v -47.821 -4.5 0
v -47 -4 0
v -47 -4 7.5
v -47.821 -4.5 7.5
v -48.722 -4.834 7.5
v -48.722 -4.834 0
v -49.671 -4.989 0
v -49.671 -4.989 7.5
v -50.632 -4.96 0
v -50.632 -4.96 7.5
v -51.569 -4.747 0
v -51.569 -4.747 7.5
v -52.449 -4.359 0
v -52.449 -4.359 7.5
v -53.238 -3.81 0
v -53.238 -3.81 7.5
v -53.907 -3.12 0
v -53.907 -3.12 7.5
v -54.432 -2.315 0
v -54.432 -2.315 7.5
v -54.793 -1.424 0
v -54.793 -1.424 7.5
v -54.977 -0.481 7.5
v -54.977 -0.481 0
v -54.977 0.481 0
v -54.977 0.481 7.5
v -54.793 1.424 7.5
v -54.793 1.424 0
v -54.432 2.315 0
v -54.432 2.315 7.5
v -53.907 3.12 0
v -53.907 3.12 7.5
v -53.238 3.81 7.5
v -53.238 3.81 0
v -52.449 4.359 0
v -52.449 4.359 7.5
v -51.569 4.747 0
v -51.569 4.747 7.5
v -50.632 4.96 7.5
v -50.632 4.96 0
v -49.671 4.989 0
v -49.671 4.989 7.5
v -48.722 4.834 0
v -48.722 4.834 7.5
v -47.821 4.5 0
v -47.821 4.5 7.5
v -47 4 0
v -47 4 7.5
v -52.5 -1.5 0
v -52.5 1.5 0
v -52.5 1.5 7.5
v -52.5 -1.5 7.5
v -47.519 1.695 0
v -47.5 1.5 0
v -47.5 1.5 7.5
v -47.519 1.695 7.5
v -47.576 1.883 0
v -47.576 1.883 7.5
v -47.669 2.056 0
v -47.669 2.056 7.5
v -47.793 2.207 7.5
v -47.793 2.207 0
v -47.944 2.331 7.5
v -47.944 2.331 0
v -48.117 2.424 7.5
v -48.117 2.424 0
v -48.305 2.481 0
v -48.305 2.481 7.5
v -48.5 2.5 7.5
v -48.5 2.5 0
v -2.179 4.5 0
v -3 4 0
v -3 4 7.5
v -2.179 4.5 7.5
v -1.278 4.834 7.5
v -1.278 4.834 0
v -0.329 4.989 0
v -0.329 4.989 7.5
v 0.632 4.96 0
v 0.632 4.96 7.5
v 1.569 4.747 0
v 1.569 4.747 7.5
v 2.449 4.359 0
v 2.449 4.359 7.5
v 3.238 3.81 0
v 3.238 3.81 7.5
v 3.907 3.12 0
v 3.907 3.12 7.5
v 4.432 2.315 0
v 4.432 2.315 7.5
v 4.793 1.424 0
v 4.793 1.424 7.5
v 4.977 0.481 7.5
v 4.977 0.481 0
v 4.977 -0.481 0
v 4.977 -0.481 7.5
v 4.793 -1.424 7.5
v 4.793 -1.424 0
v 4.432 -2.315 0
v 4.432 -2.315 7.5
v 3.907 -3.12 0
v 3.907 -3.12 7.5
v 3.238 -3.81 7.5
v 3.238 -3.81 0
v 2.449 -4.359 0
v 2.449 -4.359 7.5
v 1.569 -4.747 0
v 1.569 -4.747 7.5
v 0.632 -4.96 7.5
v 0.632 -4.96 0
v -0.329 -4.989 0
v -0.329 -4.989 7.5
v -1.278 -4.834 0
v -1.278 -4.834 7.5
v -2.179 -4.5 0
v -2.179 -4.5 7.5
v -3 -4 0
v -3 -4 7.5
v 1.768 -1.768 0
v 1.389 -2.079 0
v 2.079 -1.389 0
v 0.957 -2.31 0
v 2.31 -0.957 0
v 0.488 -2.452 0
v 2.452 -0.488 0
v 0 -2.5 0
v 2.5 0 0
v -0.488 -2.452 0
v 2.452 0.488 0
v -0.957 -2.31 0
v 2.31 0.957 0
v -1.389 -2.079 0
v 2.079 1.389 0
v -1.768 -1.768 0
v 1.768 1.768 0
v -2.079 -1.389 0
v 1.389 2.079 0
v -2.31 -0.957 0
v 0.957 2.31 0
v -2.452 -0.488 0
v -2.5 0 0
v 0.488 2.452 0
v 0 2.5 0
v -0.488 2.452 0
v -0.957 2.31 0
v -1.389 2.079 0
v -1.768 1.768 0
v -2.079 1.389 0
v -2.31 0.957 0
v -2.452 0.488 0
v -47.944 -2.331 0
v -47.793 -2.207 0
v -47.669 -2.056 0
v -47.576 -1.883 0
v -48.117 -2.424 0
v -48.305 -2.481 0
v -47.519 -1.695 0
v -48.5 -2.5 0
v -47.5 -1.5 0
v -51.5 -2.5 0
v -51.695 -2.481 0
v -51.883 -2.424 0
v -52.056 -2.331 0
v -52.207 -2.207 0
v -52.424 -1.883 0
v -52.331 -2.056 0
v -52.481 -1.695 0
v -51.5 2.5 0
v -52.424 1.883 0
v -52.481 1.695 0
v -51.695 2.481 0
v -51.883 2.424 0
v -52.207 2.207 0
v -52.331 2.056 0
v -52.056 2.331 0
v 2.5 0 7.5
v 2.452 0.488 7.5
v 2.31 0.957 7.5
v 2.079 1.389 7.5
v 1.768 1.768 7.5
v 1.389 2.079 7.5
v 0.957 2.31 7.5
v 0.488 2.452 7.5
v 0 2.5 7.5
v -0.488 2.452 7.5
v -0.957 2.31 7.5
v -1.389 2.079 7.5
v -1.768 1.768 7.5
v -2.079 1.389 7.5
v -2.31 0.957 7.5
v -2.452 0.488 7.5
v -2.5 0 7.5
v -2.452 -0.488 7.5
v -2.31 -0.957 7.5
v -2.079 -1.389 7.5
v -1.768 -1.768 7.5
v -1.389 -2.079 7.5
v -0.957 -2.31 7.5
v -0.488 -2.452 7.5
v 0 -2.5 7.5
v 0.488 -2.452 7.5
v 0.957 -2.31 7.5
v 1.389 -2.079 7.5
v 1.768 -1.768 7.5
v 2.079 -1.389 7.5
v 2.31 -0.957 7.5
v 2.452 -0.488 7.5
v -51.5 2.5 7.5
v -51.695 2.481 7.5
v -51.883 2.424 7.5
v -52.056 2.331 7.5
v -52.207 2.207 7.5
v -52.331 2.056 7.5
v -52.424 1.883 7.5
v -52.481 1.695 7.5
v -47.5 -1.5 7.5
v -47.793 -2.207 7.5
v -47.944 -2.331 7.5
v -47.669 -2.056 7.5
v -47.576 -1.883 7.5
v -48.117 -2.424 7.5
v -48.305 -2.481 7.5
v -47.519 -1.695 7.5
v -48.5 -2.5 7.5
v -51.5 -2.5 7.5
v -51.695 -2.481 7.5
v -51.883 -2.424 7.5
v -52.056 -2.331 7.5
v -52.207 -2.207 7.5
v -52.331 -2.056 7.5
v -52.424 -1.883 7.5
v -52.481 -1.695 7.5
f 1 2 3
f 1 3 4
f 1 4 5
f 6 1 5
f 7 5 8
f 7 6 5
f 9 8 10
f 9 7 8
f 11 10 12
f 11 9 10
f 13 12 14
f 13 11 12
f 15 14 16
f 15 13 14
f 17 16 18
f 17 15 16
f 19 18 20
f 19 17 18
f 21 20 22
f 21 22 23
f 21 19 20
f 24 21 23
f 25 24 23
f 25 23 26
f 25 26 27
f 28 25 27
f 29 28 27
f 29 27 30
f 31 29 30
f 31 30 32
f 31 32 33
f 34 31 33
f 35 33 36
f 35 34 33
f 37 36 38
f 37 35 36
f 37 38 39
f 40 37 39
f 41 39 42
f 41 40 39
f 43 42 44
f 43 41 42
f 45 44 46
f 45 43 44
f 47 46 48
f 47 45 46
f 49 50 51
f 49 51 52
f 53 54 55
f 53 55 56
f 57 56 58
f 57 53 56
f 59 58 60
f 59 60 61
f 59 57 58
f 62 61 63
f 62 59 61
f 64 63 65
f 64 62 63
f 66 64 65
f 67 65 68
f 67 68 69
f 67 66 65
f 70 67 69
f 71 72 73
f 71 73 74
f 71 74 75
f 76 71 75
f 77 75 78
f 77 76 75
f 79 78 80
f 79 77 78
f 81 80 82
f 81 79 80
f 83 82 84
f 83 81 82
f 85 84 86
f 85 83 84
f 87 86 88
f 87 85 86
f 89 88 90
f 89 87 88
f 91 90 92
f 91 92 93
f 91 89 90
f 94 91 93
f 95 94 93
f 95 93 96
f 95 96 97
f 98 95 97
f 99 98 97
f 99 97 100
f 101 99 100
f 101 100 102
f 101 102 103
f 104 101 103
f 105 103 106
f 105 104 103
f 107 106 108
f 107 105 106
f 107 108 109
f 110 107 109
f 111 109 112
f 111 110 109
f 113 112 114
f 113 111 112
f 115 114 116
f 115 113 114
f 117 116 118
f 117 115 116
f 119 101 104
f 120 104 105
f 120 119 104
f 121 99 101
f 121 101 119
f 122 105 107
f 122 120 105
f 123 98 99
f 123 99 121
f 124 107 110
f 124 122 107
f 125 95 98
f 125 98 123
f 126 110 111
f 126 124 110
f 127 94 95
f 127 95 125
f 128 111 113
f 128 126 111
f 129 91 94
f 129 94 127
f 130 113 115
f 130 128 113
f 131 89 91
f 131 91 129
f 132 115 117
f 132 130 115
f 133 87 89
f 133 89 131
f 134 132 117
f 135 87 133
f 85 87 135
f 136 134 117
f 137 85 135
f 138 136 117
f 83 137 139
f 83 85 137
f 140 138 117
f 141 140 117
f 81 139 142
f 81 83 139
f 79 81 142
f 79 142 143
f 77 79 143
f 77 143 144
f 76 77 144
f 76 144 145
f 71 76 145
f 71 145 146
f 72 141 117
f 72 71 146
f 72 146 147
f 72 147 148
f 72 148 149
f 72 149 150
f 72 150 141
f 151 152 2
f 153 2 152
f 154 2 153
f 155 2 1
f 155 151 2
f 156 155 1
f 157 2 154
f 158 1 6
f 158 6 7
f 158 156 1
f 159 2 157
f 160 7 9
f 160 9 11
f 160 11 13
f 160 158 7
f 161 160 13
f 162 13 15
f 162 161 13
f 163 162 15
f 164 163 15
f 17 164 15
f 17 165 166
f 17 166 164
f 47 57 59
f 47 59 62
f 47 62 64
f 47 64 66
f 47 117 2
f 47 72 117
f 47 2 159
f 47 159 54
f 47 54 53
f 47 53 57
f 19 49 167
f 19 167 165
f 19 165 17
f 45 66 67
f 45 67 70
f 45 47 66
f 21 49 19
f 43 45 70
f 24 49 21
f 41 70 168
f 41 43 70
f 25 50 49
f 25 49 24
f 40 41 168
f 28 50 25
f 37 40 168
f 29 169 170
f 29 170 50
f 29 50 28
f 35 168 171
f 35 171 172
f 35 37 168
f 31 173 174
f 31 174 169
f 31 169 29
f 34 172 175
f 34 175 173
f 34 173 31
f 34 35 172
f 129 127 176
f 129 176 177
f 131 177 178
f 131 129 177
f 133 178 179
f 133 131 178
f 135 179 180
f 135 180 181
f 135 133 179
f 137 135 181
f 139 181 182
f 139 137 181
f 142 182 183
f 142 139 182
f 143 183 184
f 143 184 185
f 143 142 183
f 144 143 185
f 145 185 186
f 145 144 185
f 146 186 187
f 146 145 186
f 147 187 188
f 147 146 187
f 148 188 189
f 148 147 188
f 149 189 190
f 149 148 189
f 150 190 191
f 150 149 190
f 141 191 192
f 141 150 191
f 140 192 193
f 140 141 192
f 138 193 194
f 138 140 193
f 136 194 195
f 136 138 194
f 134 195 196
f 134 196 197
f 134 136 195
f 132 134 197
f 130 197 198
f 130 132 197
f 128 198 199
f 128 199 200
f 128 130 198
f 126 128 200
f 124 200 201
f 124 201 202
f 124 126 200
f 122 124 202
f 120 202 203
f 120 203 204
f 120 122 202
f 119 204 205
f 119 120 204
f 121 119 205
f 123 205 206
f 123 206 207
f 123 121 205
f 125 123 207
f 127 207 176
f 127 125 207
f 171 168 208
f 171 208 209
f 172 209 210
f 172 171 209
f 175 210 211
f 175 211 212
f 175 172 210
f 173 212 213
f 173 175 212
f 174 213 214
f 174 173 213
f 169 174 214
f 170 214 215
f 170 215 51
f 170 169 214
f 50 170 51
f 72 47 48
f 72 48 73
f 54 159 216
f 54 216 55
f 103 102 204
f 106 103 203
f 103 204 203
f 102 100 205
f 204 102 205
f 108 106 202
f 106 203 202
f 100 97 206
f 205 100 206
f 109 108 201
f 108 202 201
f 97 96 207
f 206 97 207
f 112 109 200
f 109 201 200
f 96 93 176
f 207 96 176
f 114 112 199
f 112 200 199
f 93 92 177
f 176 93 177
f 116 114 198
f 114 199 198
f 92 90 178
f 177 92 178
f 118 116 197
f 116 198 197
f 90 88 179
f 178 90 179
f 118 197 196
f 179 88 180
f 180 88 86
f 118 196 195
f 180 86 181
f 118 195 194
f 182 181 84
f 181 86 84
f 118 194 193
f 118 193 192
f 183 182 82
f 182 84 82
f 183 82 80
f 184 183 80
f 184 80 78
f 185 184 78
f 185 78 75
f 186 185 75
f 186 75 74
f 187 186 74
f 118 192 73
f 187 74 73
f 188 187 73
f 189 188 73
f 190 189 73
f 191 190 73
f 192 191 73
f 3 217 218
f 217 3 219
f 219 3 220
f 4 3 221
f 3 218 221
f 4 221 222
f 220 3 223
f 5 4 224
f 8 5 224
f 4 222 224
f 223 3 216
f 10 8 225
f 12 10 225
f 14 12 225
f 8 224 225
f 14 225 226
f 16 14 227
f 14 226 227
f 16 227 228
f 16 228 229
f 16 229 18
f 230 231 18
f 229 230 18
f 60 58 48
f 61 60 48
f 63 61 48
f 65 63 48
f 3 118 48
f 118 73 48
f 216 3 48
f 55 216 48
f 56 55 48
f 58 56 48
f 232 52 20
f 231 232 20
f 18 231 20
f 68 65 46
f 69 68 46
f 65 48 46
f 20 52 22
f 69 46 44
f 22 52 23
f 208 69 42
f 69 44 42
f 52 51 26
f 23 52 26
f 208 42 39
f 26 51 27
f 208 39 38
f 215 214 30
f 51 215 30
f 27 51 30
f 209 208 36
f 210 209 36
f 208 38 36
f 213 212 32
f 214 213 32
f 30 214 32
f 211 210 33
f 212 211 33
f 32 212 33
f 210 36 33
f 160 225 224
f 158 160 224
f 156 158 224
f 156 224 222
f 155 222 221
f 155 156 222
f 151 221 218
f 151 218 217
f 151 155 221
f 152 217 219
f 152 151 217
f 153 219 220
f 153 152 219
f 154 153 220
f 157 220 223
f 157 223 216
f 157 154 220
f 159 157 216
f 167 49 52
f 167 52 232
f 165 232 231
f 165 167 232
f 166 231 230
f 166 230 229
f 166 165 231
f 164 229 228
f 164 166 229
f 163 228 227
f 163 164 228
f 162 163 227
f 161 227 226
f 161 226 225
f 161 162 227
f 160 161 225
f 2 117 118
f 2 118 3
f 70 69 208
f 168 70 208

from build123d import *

# Parameters (mm, degrees)
SKETCH1_R           = 2.5
BOSS_EXTRUDE1_DEPTH = 7.5


with BuildPart() as part:
    # Sketch1 → Boss-Extrude1 (new body)
    with BuildSketch(Plane.XY):
        with BuildLine():
            Line((-47, 4), (-3, 4))
            ThreePointArc((-3, 4), (5, 0), (-3, -4))
            Line((-3, -4), (-47, -4))
            ThreePointArc((-47, -4), (-55, 0), (-47, 4))
        make_face()
        Circle(SKETCH1_R, mode=Mode.SUBTRACT)
        with BuildLine():
            Line((-51.5, -2.5), (-48.5, -2.5))
            ThreePointArc((-48.5, -2.5), (-47.792893219, -2.207106781), (-47.5, -1.5))
            Line((-47.5, -1.5), (-47.5, 1.5))
            ThreePointArc((-47.5, 1.5), (-47.792893219, 2.207106781), (-48.5, 2.5))
            Line((-48.5, 2.5), (-51.5, 2.5))
            ThreePointArc((-51.5, 2.5), (-52.207106781, 2.207106781), (-52.5, 1.5))
            Line((-52.5, 1.5), (-52.5, -1.5))
            ThreePointArc((-52.5, -1.5), (-52.207106781, -2.207106781), (-51.5, -2.5))
        make_face(mode=Mode.SUBTRACT)
    extrude(amount=BOSS_EXTRUDE1_DEPTH)


solid = part.part
